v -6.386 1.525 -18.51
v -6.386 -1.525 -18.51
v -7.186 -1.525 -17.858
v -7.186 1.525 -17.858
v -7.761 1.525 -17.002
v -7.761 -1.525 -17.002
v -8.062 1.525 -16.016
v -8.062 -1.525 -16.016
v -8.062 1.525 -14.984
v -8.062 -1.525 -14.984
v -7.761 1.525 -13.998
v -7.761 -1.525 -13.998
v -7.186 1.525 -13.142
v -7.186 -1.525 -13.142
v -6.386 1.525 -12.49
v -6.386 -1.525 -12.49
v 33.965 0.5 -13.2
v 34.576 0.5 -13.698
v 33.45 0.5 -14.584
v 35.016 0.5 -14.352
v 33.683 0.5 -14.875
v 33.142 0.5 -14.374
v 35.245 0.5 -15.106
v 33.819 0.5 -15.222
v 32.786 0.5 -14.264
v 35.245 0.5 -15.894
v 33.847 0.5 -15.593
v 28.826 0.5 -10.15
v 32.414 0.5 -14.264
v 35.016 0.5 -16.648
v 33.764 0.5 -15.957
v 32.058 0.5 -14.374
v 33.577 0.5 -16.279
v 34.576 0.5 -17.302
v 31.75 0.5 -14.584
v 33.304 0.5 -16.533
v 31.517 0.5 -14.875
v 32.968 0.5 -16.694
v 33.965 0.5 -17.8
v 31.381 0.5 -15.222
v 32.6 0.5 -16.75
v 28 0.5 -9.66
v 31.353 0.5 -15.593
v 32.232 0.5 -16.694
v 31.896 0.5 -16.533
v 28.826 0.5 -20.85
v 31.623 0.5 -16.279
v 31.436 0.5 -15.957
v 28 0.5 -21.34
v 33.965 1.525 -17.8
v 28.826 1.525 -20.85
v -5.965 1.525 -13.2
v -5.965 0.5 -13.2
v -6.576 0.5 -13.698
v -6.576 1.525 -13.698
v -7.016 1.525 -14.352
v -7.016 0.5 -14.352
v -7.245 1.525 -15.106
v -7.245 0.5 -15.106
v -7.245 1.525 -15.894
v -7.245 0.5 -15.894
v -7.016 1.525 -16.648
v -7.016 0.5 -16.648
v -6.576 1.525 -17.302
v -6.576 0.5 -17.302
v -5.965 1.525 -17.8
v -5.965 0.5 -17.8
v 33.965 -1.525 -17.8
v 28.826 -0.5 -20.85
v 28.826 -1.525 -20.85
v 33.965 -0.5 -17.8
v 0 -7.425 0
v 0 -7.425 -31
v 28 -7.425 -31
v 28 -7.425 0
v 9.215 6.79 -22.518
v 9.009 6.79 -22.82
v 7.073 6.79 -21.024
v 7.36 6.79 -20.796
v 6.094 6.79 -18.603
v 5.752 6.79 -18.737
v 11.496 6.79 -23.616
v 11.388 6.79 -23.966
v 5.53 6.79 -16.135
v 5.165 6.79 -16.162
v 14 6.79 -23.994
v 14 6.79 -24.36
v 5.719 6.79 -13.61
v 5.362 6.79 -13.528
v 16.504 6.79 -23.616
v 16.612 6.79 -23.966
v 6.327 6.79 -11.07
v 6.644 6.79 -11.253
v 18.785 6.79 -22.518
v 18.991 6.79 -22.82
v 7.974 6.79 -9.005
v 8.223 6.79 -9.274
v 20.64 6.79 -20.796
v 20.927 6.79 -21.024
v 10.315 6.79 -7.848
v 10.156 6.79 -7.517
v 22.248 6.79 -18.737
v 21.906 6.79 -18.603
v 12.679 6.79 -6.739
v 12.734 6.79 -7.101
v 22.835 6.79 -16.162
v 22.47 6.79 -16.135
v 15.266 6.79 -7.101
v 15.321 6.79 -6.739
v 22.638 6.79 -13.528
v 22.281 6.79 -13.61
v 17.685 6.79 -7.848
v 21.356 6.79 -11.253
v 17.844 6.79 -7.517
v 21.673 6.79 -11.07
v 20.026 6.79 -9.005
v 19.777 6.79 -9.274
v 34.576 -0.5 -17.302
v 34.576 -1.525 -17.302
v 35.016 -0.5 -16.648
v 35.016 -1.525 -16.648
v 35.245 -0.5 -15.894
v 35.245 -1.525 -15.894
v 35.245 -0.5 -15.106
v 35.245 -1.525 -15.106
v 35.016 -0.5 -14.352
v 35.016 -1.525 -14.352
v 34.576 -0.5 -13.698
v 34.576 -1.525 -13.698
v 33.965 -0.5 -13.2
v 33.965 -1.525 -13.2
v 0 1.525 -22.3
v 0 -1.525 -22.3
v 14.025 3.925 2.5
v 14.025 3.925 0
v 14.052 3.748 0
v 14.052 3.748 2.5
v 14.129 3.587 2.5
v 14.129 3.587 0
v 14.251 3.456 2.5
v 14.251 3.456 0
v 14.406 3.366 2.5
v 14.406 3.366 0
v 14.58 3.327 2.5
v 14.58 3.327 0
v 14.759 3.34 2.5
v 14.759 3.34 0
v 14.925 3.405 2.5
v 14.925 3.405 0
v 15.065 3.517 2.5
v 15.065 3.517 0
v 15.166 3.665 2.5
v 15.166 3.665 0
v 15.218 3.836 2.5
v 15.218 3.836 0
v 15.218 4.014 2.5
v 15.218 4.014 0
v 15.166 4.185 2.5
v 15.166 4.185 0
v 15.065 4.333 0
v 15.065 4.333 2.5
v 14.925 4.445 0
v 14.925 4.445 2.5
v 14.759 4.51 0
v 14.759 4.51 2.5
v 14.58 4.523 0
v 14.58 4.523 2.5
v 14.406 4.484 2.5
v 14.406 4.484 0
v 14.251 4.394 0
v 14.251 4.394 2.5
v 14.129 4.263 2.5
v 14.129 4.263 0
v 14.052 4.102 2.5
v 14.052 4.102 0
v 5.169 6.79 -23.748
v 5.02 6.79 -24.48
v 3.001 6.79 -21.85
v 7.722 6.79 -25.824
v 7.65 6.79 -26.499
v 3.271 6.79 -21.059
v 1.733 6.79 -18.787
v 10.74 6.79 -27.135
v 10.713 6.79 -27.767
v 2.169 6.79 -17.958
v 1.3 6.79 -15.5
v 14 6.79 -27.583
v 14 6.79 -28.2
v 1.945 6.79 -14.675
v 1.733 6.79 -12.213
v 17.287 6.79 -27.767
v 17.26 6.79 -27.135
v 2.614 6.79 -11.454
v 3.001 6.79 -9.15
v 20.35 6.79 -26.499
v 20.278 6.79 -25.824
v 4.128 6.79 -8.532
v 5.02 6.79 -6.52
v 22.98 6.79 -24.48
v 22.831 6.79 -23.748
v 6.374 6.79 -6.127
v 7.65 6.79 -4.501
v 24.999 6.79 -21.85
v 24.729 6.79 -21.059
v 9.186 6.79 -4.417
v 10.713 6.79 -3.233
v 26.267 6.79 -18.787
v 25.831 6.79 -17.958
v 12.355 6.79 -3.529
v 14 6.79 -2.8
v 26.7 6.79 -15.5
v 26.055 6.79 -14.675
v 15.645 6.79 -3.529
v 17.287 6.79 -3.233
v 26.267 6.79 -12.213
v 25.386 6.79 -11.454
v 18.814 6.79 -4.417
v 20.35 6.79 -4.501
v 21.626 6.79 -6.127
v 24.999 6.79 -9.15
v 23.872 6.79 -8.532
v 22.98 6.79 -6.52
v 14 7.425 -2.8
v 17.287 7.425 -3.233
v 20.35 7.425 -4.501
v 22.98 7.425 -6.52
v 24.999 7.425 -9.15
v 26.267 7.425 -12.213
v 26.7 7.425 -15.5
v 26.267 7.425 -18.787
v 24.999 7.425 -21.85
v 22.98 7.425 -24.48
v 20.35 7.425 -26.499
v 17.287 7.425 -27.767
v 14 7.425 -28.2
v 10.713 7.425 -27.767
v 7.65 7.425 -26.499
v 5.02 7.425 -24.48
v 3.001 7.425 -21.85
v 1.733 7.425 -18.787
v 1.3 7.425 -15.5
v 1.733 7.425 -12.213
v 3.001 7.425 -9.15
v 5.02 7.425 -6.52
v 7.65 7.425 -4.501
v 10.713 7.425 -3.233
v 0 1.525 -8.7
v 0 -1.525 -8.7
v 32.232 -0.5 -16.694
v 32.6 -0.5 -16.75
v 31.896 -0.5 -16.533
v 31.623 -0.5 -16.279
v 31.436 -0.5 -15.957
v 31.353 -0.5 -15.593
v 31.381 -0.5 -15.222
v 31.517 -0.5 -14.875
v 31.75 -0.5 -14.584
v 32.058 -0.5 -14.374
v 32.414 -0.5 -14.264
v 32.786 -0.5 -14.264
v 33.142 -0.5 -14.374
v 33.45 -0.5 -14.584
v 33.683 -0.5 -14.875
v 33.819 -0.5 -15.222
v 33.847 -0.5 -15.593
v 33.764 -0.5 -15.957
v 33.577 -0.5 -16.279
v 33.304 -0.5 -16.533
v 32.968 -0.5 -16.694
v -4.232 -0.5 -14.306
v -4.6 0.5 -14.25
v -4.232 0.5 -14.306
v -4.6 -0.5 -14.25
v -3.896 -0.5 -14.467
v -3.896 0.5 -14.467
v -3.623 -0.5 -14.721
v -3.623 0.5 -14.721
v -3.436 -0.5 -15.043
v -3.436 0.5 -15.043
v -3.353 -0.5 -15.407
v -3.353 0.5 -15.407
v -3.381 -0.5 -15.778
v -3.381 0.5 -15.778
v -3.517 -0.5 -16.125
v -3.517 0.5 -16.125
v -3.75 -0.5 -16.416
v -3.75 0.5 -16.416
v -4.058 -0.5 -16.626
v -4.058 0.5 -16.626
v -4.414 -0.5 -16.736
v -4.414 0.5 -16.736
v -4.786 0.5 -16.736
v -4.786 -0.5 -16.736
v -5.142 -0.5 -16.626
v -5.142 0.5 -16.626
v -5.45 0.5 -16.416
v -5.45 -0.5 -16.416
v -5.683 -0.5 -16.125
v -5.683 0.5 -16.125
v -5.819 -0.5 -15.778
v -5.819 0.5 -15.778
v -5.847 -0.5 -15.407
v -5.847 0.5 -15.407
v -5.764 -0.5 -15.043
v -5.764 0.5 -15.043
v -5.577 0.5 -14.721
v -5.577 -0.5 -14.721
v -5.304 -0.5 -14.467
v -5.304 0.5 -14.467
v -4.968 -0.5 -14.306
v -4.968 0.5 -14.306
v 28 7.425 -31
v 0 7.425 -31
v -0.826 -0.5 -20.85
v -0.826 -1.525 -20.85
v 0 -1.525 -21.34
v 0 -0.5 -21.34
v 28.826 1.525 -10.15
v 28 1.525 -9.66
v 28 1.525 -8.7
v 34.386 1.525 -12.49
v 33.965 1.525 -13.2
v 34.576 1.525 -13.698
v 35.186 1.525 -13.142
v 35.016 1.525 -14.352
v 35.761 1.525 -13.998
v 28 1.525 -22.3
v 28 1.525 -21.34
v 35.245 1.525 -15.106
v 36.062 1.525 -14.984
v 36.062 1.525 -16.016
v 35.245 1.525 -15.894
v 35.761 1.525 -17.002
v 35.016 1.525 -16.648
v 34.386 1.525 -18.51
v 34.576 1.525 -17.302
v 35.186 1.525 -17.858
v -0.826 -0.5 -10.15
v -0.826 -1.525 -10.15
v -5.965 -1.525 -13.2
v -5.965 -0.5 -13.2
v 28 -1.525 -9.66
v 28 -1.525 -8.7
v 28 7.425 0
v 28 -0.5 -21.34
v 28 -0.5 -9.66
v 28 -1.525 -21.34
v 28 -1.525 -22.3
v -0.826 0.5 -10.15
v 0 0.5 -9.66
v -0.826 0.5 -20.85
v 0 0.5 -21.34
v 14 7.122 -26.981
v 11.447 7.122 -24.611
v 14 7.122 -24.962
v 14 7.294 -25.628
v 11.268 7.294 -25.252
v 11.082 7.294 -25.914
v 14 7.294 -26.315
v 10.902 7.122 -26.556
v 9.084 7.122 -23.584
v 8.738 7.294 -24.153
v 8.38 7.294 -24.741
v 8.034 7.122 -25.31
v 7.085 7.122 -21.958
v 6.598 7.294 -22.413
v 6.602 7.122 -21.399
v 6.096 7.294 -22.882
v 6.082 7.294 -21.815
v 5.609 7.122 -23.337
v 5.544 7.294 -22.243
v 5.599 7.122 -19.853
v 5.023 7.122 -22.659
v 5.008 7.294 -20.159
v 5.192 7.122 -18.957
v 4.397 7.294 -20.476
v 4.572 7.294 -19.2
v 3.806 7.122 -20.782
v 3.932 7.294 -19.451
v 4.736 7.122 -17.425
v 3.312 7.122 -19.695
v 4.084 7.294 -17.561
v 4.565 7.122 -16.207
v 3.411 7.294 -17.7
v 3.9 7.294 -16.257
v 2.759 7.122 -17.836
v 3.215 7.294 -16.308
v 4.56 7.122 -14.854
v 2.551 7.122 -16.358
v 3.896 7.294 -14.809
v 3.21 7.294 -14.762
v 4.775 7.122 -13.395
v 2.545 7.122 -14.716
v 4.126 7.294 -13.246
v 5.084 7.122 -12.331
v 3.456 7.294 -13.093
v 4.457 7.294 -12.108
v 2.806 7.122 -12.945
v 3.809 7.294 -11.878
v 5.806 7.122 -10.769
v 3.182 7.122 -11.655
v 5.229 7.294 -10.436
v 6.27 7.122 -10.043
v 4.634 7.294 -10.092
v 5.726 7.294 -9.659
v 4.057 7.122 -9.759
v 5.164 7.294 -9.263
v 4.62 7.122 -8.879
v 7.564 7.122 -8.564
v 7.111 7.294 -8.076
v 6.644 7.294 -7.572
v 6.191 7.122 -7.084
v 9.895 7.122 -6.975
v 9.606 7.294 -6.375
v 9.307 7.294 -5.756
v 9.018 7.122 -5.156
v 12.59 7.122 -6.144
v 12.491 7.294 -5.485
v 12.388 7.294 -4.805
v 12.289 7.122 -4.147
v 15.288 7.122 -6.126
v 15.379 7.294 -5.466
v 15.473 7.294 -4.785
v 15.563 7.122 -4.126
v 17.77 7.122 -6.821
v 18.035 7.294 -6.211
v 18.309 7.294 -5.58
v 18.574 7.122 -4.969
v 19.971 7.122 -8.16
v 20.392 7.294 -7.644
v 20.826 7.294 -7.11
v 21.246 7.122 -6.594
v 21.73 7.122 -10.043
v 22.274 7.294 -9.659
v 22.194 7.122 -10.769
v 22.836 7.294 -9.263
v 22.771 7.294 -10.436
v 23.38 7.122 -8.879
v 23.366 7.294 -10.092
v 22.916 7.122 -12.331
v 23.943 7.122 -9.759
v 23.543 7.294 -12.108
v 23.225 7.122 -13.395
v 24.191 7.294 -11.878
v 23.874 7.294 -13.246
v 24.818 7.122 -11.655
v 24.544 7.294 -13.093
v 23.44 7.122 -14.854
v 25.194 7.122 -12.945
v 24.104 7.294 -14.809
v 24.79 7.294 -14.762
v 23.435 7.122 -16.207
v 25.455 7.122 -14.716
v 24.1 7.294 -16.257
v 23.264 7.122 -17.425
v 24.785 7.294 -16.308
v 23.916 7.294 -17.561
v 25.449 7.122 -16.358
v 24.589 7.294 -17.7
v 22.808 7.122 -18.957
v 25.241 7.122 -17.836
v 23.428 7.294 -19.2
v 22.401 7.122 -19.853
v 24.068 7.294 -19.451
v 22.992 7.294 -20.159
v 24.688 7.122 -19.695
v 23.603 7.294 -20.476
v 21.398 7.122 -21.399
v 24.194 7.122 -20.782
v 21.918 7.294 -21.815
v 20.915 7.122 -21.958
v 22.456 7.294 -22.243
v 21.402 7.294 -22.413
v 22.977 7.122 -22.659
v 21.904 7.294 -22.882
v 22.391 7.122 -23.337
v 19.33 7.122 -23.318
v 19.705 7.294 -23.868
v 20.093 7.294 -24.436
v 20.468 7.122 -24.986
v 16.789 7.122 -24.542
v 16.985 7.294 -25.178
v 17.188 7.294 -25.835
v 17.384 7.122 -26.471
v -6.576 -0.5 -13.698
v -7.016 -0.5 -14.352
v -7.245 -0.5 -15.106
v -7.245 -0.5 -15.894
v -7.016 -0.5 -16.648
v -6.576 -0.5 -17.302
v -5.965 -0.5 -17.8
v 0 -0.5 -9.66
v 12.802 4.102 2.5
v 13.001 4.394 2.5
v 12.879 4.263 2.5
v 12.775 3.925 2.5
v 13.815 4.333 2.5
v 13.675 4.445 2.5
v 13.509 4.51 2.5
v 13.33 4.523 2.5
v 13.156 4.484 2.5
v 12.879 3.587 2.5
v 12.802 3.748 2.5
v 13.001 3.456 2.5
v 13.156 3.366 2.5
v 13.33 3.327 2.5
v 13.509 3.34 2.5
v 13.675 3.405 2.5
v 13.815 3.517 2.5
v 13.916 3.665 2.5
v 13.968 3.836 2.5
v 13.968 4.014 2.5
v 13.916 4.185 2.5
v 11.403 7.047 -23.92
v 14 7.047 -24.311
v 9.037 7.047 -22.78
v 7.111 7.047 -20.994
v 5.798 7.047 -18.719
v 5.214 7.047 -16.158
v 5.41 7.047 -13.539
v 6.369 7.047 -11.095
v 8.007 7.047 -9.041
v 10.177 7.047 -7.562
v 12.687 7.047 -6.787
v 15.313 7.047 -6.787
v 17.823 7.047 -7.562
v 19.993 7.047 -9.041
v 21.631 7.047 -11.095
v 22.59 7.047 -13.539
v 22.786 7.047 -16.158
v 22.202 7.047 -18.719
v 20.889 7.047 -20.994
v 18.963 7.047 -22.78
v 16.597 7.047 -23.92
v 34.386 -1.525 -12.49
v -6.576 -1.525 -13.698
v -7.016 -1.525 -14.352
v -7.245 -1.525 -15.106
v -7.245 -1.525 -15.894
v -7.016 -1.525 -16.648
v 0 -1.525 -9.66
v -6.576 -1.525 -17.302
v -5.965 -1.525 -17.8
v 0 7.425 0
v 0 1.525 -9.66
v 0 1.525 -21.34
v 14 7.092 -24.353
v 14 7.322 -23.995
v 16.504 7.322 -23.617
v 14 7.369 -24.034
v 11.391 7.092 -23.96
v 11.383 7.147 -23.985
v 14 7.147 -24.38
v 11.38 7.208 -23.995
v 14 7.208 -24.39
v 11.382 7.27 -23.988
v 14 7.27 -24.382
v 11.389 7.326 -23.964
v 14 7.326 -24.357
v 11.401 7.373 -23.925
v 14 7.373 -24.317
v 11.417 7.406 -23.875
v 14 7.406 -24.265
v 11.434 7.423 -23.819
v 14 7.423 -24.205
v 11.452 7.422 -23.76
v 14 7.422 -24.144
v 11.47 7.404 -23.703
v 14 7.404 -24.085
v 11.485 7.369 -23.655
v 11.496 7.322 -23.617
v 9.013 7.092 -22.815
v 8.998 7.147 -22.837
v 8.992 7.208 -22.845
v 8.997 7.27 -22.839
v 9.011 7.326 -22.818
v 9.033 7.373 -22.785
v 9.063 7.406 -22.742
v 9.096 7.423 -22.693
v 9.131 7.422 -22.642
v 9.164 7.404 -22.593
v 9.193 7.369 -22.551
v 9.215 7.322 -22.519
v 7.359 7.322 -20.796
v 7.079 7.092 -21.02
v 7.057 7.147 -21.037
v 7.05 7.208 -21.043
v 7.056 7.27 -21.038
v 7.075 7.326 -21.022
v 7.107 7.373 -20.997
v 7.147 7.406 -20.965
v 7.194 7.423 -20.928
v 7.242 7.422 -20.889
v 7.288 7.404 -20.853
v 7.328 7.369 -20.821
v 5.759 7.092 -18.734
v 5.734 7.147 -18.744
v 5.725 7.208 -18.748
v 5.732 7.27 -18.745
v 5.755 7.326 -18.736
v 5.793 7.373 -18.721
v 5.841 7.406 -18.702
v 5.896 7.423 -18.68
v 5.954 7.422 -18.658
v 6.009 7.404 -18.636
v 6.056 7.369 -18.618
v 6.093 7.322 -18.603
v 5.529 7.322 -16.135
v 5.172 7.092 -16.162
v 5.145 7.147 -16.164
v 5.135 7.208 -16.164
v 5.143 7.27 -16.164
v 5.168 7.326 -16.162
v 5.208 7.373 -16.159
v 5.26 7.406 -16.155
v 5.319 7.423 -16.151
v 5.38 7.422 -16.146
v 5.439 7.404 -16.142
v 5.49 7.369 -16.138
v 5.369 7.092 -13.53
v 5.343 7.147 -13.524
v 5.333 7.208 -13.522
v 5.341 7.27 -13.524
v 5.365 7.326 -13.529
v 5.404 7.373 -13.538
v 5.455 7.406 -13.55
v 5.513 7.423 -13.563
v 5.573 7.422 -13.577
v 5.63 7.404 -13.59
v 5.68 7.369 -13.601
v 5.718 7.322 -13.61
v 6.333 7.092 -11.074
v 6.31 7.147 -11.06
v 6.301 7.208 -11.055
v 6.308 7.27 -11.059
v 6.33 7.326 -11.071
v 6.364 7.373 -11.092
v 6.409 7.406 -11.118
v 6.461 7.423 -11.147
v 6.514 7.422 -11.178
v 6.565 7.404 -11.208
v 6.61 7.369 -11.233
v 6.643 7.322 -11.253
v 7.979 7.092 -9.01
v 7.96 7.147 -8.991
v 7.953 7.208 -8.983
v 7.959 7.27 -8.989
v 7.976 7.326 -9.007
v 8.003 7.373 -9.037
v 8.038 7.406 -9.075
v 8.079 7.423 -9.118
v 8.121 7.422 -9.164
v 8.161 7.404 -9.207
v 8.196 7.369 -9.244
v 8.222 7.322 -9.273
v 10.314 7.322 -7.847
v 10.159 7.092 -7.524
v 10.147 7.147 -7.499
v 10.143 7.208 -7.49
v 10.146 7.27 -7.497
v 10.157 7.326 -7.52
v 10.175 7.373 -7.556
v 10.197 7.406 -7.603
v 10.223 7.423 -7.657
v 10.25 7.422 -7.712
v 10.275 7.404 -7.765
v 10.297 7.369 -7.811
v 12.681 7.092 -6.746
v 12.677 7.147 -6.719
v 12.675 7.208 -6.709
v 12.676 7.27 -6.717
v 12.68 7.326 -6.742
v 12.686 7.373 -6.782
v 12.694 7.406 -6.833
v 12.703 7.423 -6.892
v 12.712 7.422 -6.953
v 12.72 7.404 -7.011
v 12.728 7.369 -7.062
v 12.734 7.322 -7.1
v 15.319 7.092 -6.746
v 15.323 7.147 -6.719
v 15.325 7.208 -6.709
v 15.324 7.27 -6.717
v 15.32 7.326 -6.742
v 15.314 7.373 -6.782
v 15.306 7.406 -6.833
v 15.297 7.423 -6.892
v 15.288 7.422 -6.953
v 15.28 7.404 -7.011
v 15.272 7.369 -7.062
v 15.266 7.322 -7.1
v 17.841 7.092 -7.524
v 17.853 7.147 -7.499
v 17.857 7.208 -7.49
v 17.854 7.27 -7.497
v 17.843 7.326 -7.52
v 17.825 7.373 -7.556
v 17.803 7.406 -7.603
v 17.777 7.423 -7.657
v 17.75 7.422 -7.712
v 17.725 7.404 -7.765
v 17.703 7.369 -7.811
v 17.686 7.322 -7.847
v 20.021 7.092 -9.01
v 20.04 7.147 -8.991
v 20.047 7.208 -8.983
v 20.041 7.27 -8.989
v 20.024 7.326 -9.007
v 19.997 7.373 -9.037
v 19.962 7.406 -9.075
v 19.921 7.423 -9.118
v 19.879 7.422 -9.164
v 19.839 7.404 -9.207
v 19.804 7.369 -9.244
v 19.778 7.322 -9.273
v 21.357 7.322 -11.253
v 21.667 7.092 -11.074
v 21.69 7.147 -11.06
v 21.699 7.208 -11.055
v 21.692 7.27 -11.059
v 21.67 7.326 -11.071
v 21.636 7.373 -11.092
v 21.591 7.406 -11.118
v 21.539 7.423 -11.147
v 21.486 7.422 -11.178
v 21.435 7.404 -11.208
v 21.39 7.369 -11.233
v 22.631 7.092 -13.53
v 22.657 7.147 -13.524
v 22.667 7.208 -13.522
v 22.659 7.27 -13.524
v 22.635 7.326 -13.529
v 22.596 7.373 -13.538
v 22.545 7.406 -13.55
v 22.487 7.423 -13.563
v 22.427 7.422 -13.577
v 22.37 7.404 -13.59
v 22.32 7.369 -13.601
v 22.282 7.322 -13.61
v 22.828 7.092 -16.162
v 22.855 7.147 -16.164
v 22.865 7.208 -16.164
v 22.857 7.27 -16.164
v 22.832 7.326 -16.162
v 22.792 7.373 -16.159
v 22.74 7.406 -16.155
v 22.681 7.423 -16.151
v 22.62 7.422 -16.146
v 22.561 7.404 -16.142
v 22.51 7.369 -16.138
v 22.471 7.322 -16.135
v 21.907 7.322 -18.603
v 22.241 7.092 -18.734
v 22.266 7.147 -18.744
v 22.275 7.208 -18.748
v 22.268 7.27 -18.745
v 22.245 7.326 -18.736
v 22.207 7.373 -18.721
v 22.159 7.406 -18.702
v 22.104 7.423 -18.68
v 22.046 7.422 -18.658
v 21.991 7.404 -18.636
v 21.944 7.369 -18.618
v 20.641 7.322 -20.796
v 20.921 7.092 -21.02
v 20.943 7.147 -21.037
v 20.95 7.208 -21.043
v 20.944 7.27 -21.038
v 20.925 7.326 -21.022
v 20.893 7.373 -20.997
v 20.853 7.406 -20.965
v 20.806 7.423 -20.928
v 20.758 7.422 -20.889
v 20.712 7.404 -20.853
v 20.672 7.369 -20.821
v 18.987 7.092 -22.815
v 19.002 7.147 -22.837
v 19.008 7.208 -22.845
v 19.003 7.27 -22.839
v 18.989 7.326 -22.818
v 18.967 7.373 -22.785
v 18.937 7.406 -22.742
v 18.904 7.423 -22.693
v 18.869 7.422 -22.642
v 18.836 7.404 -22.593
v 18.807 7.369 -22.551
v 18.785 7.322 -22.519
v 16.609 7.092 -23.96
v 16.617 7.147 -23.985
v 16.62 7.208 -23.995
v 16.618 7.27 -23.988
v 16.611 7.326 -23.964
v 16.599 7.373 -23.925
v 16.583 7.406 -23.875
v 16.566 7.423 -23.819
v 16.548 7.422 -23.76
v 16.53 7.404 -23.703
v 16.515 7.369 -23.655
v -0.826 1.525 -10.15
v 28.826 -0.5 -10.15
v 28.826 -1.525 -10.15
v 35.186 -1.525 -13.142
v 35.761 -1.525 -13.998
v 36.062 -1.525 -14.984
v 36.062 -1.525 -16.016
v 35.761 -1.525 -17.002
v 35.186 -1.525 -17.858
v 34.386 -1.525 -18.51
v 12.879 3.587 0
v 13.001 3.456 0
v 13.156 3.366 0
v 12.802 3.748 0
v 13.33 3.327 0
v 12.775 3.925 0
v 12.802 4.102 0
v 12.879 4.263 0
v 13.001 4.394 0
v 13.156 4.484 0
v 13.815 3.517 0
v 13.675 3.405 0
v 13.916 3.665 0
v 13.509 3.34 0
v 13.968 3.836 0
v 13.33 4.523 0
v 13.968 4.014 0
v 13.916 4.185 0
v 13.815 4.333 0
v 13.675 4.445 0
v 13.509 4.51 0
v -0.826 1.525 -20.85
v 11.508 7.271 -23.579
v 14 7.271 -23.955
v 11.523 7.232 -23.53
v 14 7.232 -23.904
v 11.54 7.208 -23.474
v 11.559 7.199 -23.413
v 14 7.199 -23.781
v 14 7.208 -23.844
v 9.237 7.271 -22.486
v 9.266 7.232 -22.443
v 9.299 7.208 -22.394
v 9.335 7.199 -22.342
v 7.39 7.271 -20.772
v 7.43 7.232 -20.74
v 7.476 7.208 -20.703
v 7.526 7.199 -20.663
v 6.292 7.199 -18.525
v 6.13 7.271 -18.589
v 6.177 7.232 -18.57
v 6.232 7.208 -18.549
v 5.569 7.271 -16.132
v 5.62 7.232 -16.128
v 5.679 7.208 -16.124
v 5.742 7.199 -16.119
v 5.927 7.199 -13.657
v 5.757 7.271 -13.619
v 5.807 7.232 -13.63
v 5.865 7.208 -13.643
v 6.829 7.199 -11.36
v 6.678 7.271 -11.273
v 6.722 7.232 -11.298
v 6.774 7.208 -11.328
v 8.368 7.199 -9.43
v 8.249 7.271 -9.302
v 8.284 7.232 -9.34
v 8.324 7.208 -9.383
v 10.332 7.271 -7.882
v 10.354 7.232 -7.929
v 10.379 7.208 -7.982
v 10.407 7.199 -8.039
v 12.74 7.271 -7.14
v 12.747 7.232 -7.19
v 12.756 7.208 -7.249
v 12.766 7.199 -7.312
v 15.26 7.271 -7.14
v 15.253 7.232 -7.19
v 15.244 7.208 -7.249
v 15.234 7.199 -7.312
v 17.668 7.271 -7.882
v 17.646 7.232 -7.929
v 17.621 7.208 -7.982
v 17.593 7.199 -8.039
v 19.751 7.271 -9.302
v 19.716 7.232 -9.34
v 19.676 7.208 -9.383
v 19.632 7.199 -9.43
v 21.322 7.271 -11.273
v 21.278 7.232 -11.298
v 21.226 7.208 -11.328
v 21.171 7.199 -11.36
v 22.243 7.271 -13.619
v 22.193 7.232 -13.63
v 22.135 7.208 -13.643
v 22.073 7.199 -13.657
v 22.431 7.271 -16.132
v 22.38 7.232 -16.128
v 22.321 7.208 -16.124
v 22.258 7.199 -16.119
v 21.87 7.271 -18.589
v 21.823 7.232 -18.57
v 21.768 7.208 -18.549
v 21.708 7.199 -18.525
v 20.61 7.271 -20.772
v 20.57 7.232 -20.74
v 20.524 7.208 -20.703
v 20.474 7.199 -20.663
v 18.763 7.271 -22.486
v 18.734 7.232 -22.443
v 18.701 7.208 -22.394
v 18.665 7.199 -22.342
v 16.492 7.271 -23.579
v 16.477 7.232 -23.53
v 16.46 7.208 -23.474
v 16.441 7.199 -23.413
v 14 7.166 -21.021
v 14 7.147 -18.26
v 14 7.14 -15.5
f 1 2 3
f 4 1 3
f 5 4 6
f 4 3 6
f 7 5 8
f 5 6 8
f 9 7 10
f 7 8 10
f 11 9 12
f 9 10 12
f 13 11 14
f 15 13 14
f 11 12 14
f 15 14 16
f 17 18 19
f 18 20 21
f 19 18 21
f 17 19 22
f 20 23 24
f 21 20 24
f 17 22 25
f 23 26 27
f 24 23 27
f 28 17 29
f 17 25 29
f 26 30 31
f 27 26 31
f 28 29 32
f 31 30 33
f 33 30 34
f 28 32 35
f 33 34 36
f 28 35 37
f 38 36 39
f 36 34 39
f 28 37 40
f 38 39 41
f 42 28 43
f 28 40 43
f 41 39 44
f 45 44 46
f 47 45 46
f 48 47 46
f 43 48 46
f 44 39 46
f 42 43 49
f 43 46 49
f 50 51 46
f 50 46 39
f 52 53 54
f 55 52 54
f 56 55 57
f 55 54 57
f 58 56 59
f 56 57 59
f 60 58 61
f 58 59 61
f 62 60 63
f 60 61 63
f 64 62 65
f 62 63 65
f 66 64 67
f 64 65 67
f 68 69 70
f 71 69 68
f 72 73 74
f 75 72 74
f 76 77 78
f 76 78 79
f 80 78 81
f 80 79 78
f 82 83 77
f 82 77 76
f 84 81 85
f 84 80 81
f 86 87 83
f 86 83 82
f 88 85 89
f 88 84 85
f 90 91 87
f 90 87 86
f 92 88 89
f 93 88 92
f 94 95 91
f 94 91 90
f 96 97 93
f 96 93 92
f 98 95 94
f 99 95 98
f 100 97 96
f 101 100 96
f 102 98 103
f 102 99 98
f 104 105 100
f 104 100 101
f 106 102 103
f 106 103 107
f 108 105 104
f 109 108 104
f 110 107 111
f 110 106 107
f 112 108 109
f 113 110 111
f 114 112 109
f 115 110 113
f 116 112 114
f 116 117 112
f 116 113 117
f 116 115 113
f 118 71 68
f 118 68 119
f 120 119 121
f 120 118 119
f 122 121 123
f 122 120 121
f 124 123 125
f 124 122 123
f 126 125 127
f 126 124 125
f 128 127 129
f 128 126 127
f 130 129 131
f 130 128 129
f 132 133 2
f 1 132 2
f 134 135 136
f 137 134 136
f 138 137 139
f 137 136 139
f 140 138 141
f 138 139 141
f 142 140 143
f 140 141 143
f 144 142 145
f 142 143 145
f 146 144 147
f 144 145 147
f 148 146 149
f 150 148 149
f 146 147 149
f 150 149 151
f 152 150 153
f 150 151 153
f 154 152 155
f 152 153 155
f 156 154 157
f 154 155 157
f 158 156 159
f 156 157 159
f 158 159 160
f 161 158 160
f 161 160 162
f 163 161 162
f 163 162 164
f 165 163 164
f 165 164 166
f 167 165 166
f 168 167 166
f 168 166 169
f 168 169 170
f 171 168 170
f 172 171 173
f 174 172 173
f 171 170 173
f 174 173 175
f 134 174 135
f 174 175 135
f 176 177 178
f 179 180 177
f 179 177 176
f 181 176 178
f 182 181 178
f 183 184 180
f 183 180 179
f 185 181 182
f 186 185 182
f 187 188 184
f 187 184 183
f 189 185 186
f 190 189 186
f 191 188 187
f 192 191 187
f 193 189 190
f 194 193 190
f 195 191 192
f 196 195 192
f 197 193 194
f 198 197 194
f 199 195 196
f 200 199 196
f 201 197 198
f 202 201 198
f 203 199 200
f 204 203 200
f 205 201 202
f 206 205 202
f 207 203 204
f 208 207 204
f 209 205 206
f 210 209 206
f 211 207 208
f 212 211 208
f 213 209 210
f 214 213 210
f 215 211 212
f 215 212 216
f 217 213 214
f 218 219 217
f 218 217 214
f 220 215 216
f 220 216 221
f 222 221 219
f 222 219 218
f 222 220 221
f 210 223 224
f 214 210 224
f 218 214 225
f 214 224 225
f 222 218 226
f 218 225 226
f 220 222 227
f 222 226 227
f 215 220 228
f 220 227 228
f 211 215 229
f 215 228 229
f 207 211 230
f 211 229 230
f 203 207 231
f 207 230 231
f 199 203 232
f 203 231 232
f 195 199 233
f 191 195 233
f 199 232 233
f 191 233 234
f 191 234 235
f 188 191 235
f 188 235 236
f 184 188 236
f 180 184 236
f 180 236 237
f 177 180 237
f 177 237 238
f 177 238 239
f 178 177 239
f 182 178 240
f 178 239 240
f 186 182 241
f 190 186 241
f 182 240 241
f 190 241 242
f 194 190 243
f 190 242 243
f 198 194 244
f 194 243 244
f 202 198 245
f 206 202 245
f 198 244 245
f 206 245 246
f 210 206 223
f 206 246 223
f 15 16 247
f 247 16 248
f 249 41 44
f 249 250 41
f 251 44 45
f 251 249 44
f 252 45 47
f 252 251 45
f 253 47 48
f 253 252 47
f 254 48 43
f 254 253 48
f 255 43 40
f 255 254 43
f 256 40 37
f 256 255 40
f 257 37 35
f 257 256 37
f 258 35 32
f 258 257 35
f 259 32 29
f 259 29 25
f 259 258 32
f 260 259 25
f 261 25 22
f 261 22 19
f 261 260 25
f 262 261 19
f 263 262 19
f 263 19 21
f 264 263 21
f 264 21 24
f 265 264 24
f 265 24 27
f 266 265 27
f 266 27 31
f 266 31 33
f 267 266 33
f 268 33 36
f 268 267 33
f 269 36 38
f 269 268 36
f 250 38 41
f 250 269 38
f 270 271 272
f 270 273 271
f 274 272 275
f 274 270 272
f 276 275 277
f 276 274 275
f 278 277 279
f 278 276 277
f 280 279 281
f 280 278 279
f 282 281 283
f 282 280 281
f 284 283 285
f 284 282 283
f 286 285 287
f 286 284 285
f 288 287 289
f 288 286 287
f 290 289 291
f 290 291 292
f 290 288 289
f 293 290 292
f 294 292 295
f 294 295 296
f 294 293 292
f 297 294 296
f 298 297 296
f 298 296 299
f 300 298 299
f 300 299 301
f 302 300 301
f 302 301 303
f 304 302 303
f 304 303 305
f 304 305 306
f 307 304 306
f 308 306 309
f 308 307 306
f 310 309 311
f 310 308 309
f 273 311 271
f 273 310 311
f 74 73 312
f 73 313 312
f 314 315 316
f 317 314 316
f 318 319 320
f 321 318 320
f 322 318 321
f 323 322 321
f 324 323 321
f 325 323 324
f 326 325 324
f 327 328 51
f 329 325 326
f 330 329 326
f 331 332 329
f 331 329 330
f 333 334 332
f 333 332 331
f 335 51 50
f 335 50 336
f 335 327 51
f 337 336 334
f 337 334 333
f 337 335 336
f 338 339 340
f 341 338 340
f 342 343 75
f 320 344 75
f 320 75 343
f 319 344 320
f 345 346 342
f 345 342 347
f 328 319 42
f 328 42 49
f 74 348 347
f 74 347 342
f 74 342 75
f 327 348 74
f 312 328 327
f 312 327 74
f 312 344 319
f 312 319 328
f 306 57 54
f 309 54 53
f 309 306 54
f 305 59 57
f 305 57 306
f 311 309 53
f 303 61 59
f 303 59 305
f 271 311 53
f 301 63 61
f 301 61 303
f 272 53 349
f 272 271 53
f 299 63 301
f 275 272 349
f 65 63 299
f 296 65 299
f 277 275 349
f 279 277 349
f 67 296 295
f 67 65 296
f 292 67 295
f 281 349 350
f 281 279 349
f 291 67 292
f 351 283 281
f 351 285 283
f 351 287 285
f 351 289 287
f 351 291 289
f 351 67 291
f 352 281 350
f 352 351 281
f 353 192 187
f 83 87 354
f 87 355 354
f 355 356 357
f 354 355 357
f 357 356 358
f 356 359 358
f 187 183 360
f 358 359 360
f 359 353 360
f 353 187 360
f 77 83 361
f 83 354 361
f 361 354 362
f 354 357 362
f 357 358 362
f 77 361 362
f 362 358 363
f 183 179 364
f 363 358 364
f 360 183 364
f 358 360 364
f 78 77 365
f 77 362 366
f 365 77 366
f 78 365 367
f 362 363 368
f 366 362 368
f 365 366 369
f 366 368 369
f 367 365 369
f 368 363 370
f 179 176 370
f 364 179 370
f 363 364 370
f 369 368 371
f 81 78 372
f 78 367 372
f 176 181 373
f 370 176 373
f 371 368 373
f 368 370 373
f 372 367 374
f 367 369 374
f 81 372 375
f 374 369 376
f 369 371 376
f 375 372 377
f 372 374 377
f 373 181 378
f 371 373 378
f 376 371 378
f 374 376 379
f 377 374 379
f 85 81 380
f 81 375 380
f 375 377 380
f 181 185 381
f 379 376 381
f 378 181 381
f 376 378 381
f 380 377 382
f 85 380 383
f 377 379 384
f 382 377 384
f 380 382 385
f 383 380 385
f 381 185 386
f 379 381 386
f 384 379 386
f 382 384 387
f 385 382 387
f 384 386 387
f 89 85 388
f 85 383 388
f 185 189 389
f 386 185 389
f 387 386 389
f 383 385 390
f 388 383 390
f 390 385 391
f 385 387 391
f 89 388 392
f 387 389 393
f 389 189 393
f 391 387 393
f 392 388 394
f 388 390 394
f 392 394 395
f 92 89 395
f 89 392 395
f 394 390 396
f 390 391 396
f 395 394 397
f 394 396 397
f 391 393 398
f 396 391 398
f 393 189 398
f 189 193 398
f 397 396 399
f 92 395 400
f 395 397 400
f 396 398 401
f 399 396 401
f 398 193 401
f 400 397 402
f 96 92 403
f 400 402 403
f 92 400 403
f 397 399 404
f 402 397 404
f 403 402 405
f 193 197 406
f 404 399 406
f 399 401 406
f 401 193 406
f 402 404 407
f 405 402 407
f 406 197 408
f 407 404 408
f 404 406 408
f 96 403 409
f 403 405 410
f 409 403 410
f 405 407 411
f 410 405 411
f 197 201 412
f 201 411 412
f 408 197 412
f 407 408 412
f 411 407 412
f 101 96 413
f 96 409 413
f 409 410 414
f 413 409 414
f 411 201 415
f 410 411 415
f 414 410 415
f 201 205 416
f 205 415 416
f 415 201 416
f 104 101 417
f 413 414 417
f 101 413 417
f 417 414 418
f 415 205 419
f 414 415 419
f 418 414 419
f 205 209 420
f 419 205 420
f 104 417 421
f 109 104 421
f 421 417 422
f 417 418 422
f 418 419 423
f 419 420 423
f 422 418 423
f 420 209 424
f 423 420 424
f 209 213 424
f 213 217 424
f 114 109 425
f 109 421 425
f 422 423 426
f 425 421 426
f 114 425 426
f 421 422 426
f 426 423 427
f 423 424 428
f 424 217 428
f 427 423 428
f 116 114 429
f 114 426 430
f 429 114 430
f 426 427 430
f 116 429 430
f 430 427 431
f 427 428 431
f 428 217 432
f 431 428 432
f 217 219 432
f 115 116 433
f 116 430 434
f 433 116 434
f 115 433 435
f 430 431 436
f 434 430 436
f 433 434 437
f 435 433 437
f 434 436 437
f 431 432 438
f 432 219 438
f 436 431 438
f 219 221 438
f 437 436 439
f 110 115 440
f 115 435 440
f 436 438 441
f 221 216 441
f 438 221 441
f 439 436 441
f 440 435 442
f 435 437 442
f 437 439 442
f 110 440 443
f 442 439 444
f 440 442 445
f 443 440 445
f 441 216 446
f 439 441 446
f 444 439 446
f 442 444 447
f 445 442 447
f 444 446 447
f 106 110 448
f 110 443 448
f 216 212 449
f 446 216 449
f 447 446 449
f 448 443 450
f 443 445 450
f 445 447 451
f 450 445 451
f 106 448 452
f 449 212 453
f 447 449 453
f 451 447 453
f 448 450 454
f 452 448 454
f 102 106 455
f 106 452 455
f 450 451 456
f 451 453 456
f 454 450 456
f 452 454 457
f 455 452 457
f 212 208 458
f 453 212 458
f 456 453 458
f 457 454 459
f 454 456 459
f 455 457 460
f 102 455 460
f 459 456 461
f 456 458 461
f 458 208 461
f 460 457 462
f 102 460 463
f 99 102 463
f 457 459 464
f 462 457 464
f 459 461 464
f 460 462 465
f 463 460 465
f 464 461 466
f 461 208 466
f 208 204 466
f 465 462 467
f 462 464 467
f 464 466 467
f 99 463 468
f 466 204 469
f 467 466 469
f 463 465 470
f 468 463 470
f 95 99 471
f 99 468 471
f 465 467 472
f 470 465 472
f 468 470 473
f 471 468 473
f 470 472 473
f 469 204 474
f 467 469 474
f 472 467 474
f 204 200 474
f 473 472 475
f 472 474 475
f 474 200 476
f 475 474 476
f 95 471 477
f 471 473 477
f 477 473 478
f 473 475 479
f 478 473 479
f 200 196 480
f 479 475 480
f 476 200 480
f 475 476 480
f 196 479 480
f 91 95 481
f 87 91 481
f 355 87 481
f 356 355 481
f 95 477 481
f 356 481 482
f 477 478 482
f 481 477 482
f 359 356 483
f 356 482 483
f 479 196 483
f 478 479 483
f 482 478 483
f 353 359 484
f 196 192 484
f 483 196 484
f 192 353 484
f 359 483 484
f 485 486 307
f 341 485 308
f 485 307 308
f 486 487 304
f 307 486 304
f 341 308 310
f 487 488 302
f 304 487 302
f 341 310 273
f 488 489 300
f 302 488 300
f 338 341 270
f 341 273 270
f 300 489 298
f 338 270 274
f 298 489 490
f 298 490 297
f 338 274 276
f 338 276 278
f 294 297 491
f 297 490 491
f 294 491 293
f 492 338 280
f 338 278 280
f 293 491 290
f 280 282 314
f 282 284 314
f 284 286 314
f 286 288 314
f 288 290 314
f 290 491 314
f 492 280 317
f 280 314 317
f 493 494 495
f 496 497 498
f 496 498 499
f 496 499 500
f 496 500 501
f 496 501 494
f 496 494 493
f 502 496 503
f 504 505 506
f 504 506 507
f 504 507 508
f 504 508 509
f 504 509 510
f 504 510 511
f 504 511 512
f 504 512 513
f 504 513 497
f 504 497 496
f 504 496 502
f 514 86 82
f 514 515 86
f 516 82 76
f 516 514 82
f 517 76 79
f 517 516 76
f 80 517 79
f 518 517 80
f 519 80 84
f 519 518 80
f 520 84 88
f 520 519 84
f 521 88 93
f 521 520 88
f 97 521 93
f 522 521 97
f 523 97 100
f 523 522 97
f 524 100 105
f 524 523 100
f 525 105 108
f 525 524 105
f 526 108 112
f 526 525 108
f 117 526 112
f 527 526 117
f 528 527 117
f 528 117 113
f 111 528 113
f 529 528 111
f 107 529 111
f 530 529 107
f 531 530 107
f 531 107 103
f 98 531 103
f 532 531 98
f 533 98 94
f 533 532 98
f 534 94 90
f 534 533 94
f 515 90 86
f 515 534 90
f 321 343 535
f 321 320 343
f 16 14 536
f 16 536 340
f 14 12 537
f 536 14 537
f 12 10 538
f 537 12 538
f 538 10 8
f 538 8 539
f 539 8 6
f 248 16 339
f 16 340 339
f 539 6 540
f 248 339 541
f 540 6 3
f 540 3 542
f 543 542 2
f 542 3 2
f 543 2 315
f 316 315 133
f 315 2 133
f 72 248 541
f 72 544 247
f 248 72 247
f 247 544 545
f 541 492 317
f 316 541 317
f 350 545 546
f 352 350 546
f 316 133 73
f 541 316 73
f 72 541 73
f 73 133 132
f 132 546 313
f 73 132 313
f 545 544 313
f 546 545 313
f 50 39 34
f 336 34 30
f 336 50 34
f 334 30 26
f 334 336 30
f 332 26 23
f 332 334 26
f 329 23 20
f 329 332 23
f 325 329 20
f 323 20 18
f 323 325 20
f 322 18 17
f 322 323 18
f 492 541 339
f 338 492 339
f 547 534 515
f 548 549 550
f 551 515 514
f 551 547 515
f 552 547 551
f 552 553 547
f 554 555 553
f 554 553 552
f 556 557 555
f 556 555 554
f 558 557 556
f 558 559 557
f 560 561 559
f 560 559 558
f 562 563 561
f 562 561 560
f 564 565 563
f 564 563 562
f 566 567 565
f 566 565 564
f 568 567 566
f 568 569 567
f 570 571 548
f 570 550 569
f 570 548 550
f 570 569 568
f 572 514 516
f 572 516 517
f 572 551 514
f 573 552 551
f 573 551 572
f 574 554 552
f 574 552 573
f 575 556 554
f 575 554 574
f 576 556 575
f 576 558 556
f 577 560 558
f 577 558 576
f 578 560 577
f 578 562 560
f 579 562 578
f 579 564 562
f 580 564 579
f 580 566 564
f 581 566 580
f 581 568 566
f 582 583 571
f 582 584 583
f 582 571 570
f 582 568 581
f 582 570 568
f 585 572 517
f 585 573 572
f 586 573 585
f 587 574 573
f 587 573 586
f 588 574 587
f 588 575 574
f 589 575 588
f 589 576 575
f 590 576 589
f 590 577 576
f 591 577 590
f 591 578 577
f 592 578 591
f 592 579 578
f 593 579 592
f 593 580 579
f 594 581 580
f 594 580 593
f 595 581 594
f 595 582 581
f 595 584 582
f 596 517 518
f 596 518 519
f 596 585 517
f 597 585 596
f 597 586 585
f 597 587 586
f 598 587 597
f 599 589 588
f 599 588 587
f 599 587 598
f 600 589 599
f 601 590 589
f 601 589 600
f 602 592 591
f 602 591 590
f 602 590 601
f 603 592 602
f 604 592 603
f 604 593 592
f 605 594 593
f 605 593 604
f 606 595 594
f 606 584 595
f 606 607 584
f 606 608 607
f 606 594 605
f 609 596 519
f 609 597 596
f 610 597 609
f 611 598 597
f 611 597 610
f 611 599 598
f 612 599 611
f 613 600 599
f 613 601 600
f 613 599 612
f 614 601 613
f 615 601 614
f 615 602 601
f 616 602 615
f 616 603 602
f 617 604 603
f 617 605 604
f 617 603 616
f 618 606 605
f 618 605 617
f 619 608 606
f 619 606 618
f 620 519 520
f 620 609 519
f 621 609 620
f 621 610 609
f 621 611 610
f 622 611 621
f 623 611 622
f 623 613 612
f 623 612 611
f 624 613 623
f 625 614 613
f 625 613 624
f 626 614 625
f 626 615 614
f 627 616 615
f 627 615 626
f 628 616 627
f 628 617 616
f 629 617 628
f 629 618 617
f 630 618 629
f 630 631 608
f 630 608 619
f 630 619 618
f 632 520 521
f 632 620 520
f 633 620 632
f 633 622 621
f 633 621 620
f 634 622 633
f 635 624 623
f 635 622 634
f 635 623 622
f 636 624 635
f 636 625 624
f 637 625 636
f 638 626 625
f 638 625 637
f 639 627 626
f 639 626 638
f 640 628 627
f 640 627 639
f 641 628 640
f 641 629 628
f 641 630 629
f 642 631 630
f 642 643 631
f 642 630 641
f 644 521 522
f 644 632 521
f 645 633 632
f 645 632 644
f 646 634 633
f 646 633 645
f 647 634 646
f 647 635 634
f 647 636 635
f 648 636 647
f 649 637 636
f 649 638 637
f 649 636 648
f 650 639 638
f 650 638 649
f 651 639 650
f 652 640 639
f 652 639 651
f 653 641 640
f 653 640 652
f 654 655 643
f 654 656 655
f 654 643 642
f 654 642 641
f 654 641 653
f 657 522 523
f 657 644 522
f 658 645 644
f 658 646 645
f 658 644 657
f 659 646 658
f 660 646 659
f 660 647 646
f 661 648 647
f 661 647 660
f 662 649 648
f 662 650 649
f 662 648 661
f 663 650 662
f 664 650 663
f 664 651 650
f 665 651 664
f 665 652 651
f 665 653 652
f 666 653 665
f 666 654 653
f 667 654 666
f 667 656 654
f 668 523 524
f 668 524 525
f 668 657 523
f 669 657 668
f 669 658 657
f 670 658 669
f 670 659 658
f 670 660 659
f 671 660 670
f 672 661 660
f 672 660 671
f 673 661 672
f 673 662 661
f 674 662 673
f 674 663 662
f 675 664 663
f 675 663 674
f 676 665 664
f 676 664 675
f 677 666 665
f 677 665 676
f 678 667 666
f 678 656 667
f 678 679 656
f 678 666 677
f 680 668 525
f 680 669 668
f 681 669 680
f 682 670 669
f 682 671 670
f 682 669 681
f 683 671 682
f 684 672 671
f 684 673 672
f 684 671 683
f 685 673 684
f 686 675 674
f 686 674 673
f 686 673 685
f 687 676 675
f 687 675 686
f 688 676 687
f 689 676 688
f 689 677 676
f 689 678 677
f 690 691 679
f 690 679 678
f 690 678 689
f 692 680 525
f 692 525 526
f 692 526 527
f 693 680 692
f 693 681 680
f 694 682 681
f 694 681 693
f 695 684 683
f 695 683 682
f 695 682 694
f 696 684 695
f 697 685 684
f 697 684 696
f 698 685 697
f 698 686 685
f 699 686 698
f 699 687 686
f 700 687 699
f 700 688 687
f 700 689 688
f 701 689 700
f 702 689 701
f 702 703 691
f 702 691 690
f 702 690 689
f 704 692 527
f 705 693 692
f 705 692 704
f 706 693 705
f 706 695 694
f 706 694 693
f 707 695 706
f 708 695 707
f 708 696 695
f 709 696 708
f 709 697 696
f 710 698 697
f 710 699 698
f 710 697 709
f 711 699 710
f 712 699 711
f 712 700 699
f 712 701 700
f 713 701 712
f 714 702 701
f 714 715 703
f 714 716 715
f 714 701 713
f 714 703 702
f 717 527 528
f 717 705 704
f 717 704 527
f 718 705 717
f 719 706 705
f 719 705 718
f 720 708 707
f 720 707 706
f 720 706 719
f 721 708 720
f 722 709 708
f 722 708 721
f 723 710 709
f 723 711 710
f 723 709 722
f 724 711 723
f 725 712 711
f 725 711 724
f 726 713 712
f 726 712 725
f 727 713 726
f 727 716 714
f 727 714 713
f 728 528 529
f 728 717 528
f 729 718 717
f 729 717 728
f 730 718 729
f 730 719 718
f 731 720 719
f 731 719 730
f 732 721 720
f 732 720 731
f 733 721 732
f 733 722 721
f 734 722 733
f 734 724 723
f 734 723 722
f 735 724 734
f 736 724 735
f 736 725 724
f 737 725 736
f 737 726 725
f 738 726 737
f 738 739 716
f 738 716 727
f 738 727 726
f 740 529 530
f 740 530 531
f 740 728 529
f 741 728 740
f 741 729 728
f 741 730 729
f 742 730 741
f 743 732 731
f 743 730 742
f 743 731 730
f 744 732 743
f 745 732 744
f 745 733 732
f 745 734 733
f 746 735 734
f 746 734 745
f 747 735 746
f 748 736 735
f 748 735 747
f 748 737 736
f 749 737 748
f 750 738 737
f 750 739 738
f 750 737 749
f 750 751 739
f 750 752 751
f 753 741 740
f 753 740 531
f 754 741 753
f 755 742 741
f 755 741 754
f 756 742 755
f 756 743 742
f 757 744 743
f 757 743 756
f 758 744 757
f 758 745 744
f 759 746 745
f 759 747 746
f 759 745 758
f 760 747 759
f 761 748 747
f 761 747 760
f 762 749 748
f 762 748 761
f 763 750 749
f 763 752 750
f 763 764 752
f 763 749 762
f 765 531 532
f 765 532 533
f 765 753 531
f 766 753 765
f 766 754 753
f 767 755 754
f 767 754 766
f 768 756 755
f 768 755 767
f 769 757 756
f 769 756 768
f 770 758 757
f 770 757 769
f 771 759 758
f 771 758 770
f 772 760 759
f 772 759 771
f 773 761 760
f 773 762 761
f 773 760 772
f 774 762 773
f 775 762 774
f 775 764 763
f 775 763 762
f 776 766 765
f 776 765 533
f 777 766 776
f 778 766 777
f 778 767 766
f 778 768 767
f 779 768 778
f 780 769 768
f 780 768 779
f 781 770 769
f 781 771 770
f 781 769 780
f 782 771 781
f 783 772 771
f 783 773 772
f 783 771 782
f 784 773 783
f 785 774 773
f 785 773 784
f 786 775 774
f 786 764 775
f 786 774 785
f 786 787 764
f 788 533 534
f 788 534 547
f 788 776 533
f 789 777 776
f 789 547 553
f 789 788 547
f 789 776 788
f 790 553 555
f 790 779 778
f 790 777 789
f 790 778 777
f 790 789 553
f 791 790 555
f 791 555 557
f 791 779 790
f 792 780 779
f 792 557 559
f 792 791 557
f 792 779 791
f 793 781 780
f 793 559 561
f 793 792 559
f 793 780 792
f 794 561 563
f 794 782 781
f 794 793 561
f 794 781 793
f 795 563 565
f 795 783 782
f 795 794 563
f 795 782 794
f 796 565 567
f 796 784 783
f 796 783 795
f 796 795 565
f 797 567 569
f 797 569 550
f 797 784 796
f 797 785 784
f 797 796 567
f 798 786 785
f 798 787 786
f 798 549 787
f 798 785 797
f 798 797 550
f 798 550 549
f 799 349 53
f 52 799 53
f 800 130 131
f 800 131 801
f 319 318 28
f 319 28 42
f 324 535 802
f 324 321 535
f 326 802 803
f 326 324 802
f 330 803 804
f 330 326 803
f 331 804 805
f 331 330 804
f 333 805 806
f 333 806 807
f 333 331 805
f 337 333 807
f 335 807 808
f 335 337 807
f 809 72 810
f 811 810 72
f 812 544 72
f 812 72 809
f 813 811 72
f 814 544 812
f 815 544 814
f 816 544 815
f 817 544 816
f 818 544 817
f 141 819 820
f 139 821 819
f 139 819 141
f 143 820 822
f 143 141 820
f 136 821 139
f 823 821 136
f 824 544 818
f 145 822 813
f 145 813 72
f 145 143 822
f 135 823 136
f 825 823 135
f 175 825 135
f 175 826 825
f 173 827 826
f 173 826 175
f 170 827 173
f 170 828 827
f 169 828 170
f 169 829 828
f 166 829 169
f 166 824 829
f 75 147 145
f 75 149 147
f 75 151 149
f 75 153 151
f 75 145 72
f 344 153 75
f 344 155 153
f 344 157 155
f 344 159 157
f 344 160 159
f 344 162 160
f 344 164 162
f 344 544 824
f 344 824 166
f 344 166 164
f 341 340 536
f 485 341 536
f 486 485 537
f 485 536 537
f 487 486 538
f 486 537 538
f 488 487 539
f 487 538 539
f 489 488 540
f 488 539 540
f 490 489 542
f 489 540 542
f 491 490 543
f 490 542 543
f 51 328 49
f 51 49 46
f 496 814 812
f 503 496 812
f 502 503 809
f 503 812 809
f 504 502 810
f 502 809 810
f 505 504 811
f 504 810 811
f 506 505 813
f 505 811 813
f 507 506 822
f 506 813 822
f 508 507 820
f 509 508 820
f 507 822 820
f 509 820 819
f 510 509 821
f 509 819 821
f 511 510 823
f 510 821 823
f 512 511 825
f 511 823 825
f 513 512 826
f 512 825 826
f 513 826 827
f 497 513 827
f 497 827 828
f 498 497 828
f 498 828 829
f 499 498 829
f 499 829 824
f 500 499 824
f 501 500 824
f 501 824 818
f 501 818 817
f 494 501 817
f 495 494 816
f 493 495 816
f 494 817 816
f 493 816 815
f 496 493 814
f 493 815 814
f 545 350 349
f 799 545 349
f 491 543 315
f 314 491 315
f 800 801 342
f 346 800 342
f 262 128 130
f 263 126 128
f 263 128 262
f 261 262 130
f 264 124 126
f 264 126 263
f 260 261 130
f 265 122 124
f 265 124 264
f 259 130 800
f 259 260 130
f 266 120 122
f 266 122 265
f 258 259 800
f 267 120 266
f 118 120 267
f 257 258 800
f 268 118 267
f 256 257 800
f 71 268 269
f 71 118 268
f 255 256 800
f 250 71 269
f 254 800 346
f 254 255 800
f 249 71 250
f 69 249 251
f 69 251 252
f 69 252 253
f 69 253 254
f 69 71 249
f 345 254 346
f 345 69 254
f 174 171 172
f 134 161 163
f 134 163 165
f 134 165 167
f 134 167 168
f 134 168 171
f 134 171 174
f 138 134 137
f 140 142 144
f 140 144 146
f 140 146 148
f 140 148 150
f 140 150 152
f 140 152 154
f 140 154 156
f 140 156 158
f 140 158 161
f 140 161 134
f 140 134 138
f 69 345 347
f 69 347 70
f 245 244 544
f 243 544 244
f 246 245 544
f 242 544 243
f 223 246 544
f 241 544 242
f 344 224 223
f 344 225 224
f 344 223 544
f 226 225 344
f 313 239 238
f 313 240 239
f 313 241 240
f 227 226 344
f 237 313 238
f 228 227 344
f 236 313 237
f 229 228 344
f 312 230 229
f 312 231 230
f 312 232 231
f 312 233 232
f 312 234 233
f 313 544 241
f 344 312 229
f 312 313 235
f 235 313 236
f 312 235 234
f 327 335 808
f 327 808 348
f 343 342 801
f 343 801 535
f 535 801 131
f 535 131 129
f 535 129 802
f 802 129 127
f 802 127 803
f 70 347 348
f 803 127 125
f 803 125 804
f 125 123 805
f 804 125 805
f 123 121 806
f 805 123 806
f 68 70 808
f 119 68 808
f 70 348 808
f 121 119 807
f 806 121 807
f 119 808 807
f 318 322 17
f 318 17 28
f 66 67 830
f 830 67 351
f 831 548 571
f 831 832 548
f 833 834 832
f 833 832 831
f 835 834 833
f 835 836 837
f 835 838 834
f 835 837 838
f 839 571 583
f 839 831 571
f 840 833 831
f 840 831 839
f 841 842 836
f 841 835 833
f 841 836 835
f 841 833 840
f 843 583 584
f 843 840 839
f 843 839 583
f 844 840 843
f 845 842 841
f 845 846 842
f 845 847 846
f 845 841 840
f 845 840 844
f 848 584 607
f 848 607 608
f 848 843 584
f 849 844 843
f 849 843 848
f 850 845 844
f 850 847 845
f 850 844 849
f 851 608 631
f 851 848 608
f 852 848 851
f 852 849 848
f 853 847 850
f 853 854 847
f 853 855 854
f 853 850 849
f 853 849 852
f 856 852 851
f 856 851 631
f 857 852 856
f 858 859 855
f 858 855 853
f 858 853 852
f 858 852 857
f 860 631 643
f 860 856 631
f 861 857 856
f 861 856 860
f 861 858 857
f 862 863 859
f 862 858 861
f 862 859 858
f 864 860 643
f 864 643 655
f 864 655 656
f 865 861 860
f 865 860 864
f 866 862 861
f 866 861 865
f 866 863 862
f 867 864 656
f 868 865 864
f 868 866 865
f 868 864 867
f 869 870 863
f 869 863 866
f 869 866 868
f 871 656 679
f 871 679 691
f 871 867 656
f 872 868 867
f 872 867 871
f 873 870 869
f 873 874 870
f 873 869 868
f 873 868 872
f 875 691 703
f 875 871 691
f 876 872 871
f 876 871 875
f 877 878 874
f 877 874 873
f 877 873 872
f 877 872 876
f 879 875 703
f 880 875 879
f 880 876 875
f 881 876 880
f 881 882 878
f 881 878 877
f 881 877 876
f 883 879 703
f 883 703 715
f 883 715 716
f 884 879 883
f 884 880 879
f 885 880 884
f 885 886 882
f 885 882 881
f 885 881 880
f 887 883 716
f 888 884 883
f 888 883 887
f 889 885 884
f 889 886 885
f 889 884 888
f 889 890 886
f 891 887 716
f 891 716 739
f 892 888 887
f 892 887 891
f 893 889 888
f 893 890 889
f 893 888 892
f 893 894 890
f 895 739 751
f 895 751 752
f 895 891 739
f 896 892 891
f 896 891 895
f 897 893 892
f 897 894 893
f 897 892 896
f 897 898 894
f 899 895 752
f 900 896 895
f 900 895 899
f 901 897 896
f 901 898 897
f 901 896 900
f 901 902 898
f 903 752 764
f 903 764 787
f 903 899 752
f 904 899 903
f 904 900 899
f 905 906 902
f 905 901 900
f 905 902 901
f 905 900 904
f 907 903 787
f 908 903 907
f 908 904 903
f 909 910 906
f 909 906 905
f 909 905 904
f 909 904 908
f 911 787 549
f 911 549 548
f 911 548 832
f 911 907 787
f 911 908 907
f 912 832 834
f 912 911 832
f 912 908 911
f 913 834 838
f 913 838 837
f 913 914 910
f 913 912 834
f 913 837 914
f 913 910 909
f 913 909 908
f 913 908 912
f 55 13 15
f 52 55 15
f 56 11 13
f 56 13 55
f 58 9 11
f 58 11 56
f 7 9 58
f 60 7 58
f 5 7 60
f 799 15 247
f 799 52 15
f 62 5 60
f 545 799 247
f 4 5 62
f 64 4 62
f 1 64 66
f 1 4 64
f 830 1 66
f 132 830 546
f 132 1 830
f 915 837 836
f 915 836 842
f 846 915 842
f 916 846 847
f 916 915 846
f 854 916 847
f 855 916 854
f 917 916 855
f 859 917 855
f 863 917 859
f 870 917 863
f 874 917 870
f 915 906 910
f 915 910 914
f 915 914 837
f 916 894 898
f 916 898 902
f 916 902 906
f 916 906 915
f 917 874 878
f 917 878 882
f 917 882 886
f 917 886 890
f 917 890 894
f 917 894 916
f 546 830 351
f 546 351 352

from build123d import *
from build123d.topology import SkipClean

# Parameters (mm, degrees)
SKETCH1_W           = 28
SKETCH1_H           = 31
BOSS_EXTRUDE1_DEPTH = 7.425
SKETCH2_R           = 1.25
BOSS_EXTRUDE2_DEPTH = 0.5
BOSS_EXTRUDE3_DEPTH = 1.525
SKETCH3_R           = 12.7
CUT_EXTRUDE1_DEPTH  = 0.635
SKETCH7_R           = 0.6
BOSS_EXTRUDE6_DEPTH = 2.5


with BuildPart() as part:
    # Sketch1 → Boss-Extrude1 (new, symmetric)
    with BuildSketch(Plane(origin=(0, 0, 0), x_dir=(1, 0, 0), z_dir=(0, 1, 0))):
        with Locations((14, 15.5)):
            Rectangle(SKETCH1_W, SKETCH1_H)
    extrude(amount=BOSS_EXTRUDE1_DEPTH, both=True)

    # Sketch2 → Boss-Extrude2 (add, symmetric)
    # profile 1 of 2: a face of its own
    with BuildSketch(Plane(origin=(0, 0, 0), x_dir=(1, 0, 0), z_dir=(0, 1, 0))):
        with BuildLine():
            Line((0, 8.7), (0, 22.3))
            Line((0, 22.3), (-6.386291535, 18.509844274))
            ThreePointArc((-6.386291535, 18.509844274), (-8.1, 15.5), (-6.386291535, 12.490155726))
            Line((-6.386291535, 12.490155726), (0, 8.7))
        make_face()
        with Locations((-4.6, 15.5)):
            Circle(SKETCH2_R, mode=Mode.SUBTRACT)
    # profile 2 of 2: a face of its own
    with BuildSketch(Plane(origin=(0, 0, 0), x_dir=(1, 0, 0), z_dir=(0, 1, 0))):
        with BuildLine():
            Line((34.386291535, 12.490155726), (28, 8.7))
            Line((28, 8.7), (28, 22.3))
            Line((28, 22.3), (34.386291535, 18.509844274))
            ThreePointArc((34.386291535, 18.509844274), (36.1, 15.5), (34.386291535, 12.490155726))
        make_face()
        with Locations((32.6, 15.5)):
            Circle(SKETCH2_R, mode=Mode.SUBTRACT)
    extrude(amount=BOSS_EXTRUDE2_DEPTH, both=True)

    # Sketch5 → Boss-Extrude3 (add, symmetric)
    with SkipClean():  # the faces are left unmerged after this step: merging them gives an invalid solid
        with BuildSketch(Plane(origin=(0, 0, 0), x_dir=(1, 0, 0), z_dir=(0, 1, 0))):
            with BuildLine():
                ThreePointArc((-6.386291535, 18.509844274), (-8.1, 15.5), (-6.386291535, 12.490155726))
                Line((-6.386291535, 12.490155726), (0, 8.7))
                Line((0, 8.7), (0, 9.659933384))
                Line((0, 9.659933384), (-5.964981917, 13.200048997))
                ThreePointArc((-5.964981917, 13.200048997), (-7.2745, 15.5), (-5.964981917, 17.799951003))
                Line((-5.964981917, 17.799951003), (0, 21.340066616))
                Line((0, 21.340066616), (0, 22.3))
                Line((0, 22.3), (-6.386291535, 18.509844274))
            make_face()
            with BuildLine():
                ThreePointArc((34.386291535, 12.490155726), (36.1, 15.5), (34.386291535, 18.509844274))
                Line((34.386291535, 18.509844274), (28, 22.3))
                Line((28, 22.3), (28, 21.340066616))
                Line((28, 21.340066616), (33.964981917, 17.799951003))
                ThreePointArc((33.964981917, 17.799951003), (35.2745, 15.5), (33.964981917, 13.200048997))
                Line((33.964981917, 13.200048997), (28, 9.659933384))
                Line((28, 9.659933384), (28, 8.7))
                Line((28, 8.7), (34.386291535, 12.490155726))
            make_face()
        extrude(amount=BOSS_EXTRUDE3_DEPTH, both=True)
    add(part.part.scale(1), mode=Mode.REPLACE)  # the faces are merged on a copy

    # Sketch3 → Cut-Extrude1 (cut)
    with BuildSketch(Plane(origin=(0, 7.425, 0), x_dir=(1, 0, 0), z_dir=(0, 1, 0))):
        with Locations((14, 15.5)):
            Circle(SKETCH3_R)
    extrude(amount=-CUT_EXTRUDE1_DEPTH, mode=Mode.SUBTRACT)

    # Sketch6 → Revolve1 (revolve)
    with BuildSketch(Plane(origin=(0, 0, -15.5), x_dir=(-1, 0, 0), z_dir=(0, 0, -1))):
        with BuildLine():
            Line((-22.493511176, 6.79), (-22.810948315, 7.046589007))
            ThreePointArc((-22.810948315, 7.046589007), (-22.816802833, 7.372772527), (-22.494598431, 7.321642421))
            ThreePointArc((-22.494598431, 7.321642421), (-22.403694623, 7.232370162), (-22.280839201, 7.198612444))
            ThreePointArc((-22.280839201, 7.198612444), (-18.140521992, 7.154934635), (-14, 7.140375125))
            Line((-14, 7.140375125), (-14, 6.79))
            Line((-14, 6.79), (-22.493511176, 6.79))
        make_face()
        with BuildLine():
            Line((-26.083336466, 6.79), (-22.86, 6.79))
            ThreePointArc((-22.86, 6.79), (-24.471668233, 7.315802401), (-26.083336466, 6.79))
        make_face()
    revolve(axis=Axis((14, -7.425, -15.5), (0, 1, 0)))

    # Sketch7 → Boss-Extrude6 (add)
    with BuildSketch(Plane.XY):
        with Locations((14.625, 3.925)):
            Circle(SKETCH7_R)
        with Locations((13.375, 3.925)):
            Circle(SKETCH7_R)
    extrude(amount=BOSS_EXTRUDE6_DEPTH)


solid = part.part
